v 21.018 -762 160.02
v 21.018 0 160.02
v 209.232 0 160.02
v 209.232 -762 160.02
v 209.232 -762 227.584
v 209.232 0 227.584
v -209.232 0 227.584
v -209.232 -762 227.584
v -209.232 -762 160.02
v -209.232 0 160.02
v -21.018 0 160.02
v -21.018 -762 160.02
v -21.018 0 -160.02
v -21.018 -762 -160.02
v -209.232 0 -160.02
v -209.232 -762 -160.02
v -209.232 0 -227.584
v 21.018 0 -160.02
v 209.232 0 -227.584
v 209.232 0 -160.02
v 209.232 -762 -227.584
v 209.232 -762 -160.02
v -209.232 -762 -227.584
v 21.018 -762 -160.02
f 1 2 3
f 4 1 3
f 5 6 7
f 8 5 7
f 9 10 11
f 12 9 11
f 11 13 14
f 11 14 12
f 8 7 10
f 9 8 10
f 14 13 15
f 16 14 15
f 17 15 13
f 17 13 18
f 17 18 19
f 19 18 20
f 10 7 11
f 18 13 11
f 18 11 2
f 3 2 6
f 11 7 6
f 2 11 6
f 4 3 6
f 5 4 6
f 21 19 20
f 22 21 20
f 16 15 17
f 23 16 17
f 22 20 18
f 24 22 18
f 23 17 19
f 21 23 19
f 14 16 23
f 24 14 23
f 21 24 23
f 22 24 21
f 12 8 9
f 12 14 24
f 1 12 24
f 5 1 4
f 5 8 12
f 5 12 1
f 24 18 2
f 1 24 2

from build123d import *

# Parameters (mm, degrees)
F0_W     = 42.037
F0_H     = 320.04
F1_DEPTH = 762


with BuildPart() as f1:
    # F0 (on Front) → F1 (new body)
    with BuildSketch(Plane.XZ):
        Polygon((-209.2325, 160.02), (-21.0185, 160.02), (21.0185, 160.02), (209.2325, 160.02), (209.2325, 227.584), (-209.2325, 227.584), align=None)
        Rectangle(F0_W, F0_H)
        Polygon((21.0185, -160.02), (-21.0185, -160.02), (-209.2325, -160.02), (-209.2325, -227.584), (209.2325, -227.584), (209.2325, -160.02), align=None)
    extrude(amount=F1_DEPTH)


solid = f1.part
